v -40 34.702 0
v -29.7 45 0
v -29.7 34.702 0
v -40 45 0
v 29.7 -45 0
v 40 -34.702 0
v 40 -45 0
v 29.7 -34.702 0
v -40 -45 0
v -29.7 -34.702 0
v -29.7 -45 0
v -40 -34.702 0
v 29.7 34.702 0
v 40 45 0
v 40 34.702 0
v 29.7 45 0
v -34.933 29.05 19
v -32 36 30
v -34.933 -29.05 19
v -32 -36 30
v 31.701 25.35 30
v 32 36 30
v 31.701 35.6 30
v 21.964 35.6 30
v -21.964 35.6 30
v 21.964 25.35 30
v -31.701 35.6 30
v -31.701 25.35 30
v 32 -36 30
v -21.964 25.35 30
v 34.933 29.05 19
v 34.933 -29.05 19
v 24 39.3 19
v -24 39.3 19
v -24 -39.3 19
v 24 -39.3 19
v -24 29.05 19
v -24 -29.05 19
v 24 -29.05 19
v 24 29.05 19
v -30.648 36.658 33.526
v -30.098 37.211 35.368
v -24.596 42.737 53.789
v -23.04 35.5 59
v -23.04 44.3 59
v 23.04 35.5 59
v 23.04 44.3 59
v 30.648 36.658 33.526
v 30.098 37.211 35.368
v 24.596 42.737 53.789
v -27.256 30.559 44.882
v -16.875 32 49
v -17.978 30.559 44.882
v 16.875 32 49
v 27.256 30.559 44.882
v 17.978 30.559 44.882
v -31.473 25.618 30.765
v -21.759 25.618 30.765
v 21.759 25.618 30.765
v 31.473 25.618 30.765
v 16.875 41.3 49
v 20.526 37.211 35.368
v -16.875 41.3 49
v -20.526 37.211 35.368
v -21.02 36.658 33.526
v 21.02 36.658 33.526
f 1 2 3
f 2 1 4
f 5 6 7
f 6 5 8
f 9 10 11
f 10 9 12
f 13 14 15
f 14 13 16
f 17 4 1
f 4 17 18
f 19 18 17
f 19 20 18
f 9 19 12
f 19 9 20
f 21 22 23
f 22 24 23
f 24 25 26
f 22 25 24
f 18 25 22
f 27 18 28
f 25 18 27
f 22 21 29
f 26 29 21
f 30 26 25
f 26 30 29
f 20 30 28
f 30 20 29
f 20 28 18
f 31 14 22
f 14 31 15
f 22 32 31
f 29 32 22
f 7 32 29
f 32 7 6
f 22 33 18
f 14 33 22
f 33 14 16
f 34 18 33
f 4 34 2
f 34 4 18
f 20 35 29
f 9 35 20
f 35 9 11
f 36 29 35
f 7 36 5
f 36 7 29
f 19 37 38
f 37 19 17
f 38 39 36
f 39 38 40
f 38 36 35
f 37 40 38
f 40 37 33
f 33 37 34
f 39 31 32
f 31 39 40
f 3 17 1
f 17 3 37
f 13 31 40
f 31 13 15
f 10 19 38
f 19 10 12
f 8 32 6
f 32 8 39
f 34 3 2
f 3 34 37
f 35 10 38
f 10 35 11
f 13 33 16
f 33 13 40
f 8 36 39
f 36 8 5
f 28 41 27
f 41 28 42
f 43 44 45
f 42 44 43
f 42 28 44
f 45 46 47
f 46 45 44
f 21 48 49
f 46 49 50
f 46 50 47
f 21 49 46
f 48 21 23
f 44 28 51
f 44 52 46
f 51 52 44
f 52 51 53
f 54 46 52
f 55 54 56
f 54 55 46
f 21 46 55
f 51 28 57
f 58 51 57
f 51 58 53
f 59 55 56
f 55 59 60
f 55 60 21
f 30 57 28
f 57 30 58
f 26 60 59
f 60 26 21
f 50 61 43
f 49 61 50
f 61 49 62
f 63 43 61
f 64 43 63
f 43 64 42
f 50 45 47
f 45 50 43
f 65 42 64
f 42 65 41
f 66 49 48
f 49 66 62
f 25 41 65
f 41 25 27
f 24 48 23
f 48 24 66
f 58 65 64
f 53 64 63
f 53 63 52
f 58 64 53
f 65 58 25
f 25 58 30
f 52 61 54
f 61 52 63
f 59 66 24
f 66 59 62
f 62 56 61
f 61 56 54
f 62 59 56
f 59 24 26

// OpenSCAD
echo(version=version());

color("green")
    difference() {
        linear_extrude(height = 30, scale = 0.8)
            square([80, 90], center = true);
        translate([0,0,-1])
            linear_extrude(height = 20, scale = 0.83)
                square([100, 70], center = true);
        translate([0,0,-1])
            linear_extrude(height = 20, scale = 0.8)
                square([60, 100], center = true);
    }
color("cyan")
    difference() {
        translate([0, 40, 29])
            linear_extrude(height = 30, scale = [0.72, 0.3] )
                square([64, 30], center = true);
        translate([0, 50, 28])
            linear_extrude(height = 35, scale = [0.72, 0.3])
                square([66, 30], center = true);
        translate([0, 35, 28])
            linear_extrude(height = 21, scale = 0.75)
                square([45, 50], center = true);
    }
